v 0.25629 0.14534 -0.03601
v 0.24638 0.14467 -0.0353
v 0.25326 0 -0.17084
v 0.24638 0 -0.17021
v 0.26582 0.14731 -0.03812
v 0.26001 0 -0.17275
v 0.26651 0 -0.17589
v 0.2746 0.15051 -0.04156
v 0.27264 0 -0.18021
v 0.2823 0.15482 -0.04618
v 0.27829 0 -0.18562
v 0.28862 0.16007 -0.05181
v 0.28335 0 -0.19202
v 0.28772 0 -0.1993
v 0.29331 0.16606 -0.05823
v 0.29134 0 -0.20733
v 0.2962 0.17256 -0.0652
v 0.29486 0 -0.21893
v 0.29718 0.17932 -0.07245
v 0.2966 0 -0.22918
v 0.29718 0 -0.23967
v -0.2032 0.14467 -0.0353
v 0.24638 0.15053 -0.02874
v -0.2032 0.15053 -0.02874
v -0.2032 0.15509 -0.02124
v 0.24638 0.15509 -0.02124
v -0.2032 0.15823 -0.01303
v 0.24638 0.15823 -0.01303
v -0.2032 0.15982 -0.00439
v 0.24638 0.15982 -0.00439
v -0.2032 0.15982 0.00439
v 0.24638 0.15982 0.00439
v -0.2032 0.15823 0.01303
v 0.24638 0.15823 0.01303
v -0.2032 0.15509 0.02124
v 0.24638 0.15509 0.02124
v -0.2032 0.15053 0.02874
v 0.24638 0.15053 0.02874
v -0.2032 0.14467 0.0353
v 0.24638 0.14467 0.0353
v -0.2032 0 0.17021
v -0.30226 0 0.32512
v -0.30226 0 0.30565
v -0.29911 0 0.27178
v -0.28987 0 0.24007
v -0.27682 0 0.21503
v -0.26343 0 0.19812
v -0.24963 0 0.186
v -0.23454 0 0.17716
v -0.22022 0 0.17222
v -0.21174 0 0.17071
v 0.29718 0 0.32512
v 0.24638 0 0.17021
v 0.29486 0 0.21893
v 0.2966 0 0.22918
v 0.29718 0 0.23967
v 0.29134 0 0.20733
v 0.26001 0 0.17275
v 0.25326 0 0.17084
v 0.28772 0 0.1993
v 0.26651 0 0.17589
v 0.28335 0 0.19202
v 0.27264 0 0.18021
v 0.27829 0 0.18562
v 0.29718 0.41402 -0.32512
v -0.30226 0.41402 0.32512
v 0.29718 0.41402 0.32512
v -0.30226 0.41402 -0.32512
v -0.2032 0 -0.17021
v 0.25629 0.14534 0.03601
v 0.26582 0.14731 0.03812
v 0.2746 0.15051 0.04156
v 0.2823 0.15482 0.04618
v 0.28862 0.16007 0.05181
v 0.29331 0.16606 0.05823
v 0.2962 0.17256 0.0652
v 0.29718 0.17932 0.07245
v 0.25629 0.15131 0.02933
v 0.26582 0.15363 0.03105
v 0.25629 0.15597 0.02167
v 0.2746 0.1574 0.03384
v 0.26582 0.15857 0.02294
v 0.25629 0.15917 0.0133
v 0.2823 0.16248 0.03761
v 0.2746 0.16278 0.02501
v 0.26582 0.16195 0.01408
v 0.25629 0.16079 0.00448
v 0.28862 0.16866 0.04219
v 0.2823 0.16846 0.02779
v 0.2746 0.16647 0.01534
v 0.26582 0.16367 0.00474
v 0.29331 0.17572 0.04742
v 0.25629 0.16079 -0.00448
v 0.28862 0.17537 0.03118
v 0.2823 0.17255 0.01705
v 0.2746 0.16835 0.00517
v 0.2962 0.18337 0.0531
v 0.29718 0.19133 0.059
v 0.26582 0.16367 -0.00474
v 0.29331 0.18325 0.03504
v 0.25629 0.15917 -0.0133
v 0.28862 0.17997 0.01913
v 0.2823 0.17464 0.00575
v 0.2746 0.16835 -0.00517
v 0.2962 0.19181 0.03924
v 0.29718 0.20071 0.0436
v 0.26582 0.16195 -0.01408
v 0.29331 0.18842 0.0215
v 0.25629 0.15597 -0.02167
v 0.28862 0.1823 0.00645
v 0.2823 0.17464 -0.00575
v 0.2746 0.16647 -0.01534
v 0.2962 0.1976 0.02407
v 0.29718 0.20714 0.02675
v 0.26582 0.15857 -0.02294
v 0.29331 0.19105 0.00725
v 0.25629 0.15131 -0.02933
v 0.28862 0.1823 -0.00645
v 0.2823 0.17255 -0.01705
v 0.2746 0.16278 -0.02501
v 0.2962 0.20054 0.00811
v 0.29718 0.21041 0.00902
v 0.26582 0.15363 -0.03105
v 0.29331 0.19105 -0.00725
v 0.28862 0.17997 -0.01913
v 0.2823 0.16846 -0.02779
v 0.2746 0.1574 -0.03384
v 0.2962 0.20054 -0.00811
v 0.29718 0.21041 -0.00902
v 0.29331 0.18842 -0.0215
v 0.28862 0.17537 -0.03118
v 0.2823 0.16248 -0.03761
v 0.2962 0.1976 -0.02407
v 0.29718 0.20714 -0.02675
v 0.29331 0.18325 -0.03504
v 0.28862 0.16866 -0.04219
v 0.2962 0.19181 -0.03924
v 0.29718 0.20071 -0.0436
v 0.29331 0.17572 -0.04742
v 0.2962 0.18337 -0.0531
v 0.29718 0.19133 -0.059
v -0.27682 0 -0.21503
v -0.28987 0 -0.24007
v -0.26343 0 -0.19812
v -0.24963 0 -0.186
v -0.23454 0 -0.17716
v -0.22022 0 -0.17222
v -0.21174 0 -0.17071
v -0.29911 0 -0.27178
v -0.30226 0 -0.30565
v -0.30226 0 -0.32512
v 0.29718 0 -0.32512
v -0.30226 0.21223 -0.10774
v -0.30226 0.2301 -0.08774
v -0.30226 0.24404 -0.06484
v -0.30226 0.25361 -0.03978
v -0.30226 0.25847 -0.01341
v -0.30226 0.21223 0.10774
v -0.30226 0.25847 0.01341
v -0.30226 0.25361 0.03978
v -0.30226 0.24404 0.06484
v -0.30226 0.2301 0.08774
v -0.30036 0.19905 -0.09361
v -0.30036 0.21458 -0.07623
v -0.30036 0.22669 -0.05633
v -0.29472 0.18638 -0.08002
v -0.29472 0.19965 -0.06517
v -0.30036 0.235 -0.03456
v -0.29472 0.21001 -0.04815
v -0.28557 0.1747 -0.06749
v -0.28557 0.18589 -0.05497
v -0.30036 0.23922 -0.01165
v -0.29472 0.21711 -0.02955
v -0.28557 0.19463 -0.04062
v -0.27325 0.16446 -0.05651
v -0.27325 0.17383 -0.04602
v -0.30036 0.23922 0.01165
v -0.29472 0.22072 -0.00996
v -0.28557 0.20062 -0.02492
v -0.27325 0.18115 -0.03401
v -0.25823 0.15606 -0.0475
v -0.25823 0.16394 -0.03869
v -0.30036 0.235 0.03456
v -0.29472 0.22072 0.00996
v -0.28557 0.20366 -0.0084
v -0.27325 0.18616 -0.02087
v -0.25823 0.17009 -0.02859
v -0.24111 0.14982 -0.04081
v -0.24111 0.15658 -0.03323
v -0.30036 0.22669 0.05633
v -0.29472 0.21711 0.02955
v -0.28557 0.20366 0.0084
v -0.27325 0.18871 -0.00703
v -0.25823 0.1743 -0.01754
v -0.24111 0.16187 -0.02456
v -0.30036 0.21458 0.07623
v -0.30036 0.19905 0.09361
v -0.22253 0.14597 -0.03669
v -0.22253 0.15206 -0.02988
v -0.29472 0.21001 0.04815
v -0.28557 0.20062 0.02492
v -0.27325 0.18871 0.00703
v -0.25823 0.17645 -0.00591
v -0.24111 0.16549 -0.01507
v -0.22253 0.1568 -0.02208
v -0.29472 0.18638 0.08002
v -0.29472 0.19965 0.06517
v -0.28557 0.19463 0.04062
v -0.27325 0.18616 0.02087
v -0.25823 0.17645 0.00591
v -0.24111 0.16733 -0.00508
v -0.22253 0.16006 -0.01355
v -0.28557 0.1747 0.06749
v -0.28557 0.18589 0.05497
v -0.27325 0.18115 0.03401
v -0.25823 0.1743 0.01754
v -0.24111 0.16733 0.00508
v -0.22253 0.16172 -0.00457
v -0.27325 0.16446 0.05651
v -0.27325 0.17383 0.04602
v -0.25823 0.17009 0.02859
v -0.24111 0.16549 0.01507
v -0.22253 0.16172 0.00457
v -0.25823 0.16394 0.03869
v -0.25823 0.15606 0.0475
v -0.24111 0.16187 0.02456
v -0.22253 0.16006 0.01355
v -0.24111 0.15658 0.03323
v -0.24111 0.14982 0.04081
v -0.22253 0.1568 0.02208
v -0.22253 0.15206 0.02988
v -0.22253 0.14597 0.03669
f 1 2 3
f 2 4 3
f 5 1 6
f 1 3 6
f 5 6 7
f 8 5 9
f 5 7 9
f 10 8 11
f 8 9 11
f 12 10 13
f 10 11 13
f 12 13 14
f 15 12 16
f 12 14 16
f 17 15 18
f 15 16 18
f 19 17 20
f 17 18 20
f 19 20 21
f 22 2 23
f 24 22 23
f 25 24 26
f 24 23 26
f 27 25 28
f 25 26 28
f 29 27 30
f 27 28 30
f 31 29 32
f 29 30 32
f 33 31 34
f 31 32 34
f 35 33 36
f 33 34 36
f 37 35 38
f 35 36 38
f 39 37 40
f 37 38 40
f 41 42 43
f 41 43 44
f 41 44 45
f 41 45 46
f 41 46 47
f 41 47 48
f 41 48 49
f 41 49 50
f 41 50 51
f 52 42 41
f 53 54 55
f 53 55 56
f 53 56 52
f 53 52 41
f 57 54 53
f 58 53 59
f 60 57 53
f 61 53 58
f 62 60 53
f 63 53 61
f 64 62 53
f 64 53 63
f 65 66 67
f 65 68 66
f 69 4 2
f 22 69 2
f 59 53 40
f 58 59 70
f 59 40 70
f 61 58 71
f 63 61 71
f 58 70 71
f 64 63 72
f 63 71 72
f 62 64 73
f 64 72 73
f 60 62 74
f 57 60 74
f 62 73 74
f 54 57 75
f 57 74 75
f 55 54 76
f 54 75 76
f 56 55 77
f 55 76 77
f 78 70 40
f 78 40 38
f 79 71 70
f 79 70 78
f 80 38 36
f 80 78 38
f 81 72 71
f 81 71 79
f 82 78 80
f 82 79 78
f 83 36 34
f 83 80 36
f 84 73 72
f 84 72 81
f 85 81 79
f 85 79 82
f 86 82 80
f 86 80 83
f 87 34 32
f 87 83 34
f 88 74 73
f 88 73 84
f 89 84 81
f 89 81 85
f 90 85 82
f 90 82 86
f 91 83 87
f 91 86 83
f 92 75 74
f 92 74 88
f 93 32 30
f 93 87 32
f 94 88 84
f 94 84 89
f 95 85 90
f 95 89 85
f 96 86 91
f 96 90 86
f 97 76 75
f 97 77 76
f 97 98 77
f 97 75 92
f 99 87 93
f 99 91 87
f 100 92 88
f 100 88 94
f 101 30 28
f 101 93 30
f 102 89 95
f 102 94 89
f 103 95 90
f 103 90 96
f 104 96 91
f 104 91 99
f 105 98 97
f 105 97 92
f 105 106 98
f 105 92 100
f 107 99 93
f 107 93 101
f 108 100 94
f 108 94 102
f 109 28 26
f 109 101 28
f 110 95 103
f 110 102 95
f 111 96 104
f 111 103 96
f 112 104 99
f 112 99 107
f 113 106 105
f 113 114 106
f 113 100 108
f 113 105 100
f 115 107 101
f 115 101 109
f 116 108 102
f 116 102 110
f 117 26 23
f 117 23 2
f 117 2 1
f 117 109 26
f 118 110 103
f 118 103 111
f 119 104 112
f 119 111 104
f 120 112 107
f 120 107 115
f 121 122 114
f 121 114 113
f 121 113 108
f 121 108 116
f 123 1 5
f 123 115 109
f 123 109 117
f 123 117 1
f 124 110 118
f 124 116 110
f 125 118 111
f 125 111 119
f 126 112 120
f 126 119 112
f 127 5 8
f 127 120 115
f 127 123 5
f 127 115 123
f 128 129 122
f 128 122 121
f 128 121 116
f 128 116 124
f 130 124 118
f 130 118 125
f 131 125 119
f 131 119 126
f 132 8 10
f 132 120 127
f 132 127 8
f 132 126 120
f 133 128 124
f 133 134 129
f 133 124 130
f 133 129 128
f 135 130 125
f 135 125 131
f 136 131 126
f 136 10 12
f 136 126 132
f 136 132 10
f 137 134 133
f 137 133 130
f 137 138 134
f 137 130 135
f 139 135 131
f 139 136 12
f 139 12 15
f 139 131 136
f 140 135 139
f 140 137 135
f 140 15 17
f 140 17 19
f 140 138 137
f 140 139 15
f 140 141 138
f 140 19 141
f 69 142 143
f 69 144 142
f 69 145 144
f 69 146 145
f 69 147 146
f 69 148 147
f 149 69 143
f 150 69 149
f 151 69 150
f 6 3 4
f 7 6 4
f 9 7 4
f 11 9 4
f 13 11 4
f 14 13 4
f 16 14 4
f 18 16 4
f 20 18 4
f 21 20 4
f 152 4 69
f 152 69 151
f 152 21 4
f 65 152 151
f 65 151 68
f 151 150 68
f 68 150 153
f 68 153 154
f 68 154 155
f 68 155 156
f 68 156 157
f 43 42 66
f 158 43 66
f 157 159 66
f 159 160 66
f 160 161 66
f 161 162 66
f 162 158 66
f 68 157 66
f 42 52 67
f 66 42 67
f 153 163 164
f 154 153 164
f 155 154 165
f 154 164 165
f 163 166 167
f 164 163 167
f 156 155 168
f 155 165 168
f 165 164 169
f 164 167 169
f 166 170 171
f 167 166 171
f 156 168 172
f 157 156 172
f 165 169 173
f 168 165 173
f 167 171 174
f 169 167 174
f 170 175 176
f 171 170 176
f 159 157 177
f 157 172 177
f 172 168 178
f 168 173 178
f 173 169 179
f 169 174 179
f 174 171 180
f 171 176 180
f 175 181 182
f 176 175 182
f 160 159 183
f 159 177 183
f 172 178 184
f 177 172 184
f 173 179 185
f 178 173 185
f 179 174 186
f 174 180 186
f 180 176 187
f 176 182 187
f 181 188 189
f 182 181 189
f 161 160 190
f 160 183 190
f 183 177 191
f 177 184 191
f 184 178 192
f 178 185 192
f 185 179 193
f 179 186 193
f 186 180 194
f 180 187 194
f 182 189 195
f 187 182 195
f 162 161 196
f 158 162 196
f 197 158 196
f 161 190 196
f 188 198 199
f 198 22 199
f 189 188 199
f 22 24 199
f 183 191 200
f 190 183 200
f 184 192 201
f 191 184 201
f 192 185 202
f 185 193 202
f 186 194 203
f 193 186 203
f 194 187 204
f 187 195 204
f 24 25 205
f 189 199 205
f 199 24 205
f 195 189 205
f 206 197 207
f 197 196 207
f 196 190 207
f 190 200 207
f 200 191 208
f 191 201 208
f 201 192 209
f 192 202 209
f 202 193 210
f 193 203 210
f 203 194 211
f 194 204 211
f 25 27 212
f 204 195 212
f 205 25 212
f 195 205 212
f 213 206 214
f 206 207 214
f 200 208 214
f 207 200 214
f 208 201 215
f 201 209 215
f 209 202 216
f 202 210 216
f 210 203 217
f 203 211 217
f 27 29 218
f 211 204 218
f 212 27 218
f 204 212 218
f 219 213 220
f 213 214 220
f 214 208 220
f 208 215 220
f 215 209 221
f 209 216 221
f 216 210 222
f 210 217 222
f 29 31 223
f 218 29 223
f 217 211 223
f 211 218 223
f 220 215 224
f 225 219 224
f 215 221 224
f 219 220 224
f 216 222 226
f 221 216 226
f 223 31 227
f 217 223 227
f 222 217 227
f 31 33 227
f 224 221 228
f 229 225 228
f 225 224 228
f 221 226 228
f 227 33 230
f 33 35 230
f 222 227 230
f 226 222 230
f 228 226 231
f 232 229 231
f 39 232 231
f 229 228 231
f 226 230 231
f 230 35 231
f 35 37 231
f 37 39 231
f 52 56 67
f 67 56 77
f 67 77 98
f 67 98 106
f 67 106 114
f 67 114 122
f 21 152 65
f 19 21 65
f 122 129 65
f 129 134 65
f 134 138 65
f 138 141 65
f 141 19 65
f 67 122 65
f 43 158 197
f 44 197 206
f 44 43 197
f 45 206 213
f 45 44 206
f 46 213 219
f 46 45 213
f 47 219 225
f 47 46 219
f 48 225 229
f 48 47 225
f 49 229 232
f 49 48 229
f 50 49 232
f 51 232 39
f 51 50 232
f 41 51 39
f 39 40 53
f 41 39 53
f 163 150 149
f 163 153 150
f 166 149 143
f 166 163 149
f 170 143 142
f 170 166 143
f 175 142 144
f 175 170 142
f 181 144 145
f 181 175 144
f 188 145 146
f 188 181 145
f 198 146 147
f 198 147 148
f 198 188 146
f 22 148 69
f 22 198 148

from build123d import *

# Parameters (mm, degrees)
SKETCH_TL_CUTTING_R    = 1.4986
TL_CUTTING_DEPTH       = 29.999999944
SKETCH_TDF_CUTTING_W   = 3.01719996
SKETCH_TDF_CUTTING_H   = 3.01719996
TDF_CUTTING_DEPTH      = 31.074766841
VW_VR_GRINDING_DEPTH   = 1.50859998
VW_VR_GRINDING_2_DEPTH = 1.50859998
ISA_GRINDING_DEPTH     = 1.50859998
SKETCH_PRE_FRX_BRX_W   = 1.19142002
SKETCH_PRE_FRX_BRX_H   = 0.89916
SKETCH_PRE_FRX_BRX_W_2 = 1.21633996
PRE_FRX_BRX_DEPTH      = 1.50859998
FA_BA_GRINDING_DEPTH   = 1.50859998
BR_EDM_R               = 0.09906
FR_EDM_R               = 0.0508


with BuildPart() as part:
    # sketch_TL_cutting → TL_cutting (new body)
    with BuildSketch(Plane(origin=(0, 0, 0), x_dir=(1, 0, 0), z_dir=(0, 1, 0))):
        with Locations(Location((0, 0, 0), (0, 0, 270))):
            Circle(SKETCH_TL_CUTTING_R)
    extrude(amount=TL_CUTTING_DEPTH)

    # sketch_TDF_cutting → TDF_cutting (cut, through all)
    with BuildSketch(Plane(origin=(0, 0, 0), x_dir=(1, 0, 0), z_dir=(0, 1, 0))):
        with Locations((-2.71001998, 0)):
            Rectangle(SKETCH_TDF_CUTTING_W, SKETCH_TDF_CUTTING_H)
    extrude(amount=TDF_CUTTING_DEPTH, mode=Mode.SUBTRACT)


with BuildPart() as body_2:
    # sketch_VW_VR_grinding → VW_VR_grinding (new, symmetric)
    with BuildSketch(Plane(origin=(0, 0, 0), x_dir=(0, 0, -1), z_dir=(1, 0, 0))):
        with BuildLine():
            Line((-0.32512, -0.00999998), (-0.32512, 0.876937879))
            ThreePointArc((-0.32512, 0.876937879), (-0.326086547, 0.899075438), (-0.328978831, 0.921044517))
            Line((-0.328978831, 0.921044517), (-1.51859996, 7.667721199))
            Line((-1.51859996, 7.667721199), (-1.50859998, -0.00999998))
            Line((-1.50859998, -0.00999998), (-0.32512, -0.00999998))
        make_face()
    extrude(amount=VW_VR_GRINDING_DEPTH, both=True)


with BuildPart() as body_3:
    # sketch_VW_VR_grinding → VW_VR_grinding 2 (new, symmetric)
    with BuildSketch(Plane(origin=(0, 0, 0), x_dir=(0, 0, -1), z_dir=(1, 0, 0))):
        with BuildLine():
            Line((0.32512, -0.00999998), (0.32512, 0.876937879))
            ThreePointArc((0.32512, 0.876937879), (0.326086547, 0.899075438), (0.328978831, 0.921044517))
            Line((0.328978831, 0.921044517), (1.51859996, 7.667721199))
            Line((1.51859996, 7.667721199), (1.50859998, -0.00999998))
            Line((1.50859998, -0.00999998), (0.32512, -0.00999998))
        make_face()
    extrude(amount=VW_VR_GRINDING_2_DEPTH, both=True)


    add(body_2.part)  # ISA_grinding merges body 2
    # sketch_ISA_grinding → ISA_grinding (add, symmetric)
    with BuildSketch(Plane(origin=(0, 0, 0), x_dir=(0, 0, -1), z_dir=(1, 0, 0))):
        Polygon((-0.32512, 0), (0.32512, 0), (1.50859998, 6.711848494), (1.50859998, -0.02999994), (-1.50859998, -0.02999994), (-1.50859998, 6.711848494), align=None)
    extrude(amount=ISA_GRINDING_DEPTH, both=True)

    # sketch_pre_FRX_BRX → pre_FRX_BRX (add, symmetric)
    with BuildSketch(Plane.XY):
        with Locations((0.90288999, 0.43958002)):
            Rectangle(SKETCH_PRE_FRX_BRX_W, SKETCH_PRE_FRX_BRX_H)
        with Locations((-0.91042998, 0.43958002)):
            Rectangle(SKETCH_PRE_FRX_BRX_W_2, SKETCH_PRE_FRX_BRX_H)
    extrude(amount=PRE_FRX_BRX_DEPTH, both=True)

    # sketch_FA_BA_grinding → FA_BA_grinding (add, symmetric)
    with BuildSketch(Plane.XY):
        Polygon((0.29718, -0.00999998), (0.29718, 0.89916), (1.6256, 10.351359447), (1.6256, -0.00999998), align=None)
        Polygon((-0.30226, -0.00999998), (-0.30226, 0.89916), (-1.32842, 8.200667794), (-1.32842, -0.00999998), align=None)
    extrude(amount=FA_BA_GRINDING_DEPTH, both=True)


with BuildPart() as part_1:
    add(part.part)

    # B1_fix: cut body 3
    add(body_3.part, mode=Mode.SUBTRACT)

    # V-Groove_EDM: sweep along a path in sketch_contour_V-Groove
    with BuildLine(Plane.XY) as v_groove_edm_path:
        Line((-1.20142, 0.16002), (1.4986, 0.16002))
    # sketch_section_V-Groove → V-Groove_EDM (sweep, cut)
    with BuildSketch(Plane(origin=(-1.20142, 0, -1.2954), x_dir=(0, 0, -1), z_dir=(1, 0, 0))):
        with BuildLine():
            Line((-1.26010487, 0.144673241), (-1.115869758, -0.00999998))
            Line((-1.115869758, -0.00999998), (-1.474930242, -0.00999998))
            Line((-1.474930242, -0.00999998), (-1.33069513, 0.144673241))
            ThreePointArc((-1.33069513, 0.144673241), (-1.2954, 0.16002), (-1.26010487, 0.144673241))
        make_face()
    sweep(path=v_groove_edm_path.line, mode=Mode.SUBTRACT)

    # BR_EDM
    br_edm_edges = [part_1.edges().sort_by_distance(p)[0] for p in [
        (-0.30226, 0.16002, 0),
        (-0.30226, 0.07233662, -0.102750119),
        (-0.30226, 0.07233662, 0.102750119),
    ]]
    fillet(br_edm_edges, radius=BR_EDM_R)

    # FR_EDM
    fr_edm_edges = [part_1.edges().sort_by_distance(p)[0] for p in [
        (0.29718, 0.07233662, -0.102750119),
        (0.29718, 0.07233662, 0.102750119),
        (0.29718, 0.16002, 0),
    ]]
    fillet(fr_edm_edges, radius=FR_EDM_R)

    # SurfaceCut1
    split(bisect_by=Plane(origin=(0, 0.41401793, 0), x_dir=(1, 0, 0), z_dir=(0, 1, 0)), keep=Keep.BOTTOM)


solid = part_1.part
